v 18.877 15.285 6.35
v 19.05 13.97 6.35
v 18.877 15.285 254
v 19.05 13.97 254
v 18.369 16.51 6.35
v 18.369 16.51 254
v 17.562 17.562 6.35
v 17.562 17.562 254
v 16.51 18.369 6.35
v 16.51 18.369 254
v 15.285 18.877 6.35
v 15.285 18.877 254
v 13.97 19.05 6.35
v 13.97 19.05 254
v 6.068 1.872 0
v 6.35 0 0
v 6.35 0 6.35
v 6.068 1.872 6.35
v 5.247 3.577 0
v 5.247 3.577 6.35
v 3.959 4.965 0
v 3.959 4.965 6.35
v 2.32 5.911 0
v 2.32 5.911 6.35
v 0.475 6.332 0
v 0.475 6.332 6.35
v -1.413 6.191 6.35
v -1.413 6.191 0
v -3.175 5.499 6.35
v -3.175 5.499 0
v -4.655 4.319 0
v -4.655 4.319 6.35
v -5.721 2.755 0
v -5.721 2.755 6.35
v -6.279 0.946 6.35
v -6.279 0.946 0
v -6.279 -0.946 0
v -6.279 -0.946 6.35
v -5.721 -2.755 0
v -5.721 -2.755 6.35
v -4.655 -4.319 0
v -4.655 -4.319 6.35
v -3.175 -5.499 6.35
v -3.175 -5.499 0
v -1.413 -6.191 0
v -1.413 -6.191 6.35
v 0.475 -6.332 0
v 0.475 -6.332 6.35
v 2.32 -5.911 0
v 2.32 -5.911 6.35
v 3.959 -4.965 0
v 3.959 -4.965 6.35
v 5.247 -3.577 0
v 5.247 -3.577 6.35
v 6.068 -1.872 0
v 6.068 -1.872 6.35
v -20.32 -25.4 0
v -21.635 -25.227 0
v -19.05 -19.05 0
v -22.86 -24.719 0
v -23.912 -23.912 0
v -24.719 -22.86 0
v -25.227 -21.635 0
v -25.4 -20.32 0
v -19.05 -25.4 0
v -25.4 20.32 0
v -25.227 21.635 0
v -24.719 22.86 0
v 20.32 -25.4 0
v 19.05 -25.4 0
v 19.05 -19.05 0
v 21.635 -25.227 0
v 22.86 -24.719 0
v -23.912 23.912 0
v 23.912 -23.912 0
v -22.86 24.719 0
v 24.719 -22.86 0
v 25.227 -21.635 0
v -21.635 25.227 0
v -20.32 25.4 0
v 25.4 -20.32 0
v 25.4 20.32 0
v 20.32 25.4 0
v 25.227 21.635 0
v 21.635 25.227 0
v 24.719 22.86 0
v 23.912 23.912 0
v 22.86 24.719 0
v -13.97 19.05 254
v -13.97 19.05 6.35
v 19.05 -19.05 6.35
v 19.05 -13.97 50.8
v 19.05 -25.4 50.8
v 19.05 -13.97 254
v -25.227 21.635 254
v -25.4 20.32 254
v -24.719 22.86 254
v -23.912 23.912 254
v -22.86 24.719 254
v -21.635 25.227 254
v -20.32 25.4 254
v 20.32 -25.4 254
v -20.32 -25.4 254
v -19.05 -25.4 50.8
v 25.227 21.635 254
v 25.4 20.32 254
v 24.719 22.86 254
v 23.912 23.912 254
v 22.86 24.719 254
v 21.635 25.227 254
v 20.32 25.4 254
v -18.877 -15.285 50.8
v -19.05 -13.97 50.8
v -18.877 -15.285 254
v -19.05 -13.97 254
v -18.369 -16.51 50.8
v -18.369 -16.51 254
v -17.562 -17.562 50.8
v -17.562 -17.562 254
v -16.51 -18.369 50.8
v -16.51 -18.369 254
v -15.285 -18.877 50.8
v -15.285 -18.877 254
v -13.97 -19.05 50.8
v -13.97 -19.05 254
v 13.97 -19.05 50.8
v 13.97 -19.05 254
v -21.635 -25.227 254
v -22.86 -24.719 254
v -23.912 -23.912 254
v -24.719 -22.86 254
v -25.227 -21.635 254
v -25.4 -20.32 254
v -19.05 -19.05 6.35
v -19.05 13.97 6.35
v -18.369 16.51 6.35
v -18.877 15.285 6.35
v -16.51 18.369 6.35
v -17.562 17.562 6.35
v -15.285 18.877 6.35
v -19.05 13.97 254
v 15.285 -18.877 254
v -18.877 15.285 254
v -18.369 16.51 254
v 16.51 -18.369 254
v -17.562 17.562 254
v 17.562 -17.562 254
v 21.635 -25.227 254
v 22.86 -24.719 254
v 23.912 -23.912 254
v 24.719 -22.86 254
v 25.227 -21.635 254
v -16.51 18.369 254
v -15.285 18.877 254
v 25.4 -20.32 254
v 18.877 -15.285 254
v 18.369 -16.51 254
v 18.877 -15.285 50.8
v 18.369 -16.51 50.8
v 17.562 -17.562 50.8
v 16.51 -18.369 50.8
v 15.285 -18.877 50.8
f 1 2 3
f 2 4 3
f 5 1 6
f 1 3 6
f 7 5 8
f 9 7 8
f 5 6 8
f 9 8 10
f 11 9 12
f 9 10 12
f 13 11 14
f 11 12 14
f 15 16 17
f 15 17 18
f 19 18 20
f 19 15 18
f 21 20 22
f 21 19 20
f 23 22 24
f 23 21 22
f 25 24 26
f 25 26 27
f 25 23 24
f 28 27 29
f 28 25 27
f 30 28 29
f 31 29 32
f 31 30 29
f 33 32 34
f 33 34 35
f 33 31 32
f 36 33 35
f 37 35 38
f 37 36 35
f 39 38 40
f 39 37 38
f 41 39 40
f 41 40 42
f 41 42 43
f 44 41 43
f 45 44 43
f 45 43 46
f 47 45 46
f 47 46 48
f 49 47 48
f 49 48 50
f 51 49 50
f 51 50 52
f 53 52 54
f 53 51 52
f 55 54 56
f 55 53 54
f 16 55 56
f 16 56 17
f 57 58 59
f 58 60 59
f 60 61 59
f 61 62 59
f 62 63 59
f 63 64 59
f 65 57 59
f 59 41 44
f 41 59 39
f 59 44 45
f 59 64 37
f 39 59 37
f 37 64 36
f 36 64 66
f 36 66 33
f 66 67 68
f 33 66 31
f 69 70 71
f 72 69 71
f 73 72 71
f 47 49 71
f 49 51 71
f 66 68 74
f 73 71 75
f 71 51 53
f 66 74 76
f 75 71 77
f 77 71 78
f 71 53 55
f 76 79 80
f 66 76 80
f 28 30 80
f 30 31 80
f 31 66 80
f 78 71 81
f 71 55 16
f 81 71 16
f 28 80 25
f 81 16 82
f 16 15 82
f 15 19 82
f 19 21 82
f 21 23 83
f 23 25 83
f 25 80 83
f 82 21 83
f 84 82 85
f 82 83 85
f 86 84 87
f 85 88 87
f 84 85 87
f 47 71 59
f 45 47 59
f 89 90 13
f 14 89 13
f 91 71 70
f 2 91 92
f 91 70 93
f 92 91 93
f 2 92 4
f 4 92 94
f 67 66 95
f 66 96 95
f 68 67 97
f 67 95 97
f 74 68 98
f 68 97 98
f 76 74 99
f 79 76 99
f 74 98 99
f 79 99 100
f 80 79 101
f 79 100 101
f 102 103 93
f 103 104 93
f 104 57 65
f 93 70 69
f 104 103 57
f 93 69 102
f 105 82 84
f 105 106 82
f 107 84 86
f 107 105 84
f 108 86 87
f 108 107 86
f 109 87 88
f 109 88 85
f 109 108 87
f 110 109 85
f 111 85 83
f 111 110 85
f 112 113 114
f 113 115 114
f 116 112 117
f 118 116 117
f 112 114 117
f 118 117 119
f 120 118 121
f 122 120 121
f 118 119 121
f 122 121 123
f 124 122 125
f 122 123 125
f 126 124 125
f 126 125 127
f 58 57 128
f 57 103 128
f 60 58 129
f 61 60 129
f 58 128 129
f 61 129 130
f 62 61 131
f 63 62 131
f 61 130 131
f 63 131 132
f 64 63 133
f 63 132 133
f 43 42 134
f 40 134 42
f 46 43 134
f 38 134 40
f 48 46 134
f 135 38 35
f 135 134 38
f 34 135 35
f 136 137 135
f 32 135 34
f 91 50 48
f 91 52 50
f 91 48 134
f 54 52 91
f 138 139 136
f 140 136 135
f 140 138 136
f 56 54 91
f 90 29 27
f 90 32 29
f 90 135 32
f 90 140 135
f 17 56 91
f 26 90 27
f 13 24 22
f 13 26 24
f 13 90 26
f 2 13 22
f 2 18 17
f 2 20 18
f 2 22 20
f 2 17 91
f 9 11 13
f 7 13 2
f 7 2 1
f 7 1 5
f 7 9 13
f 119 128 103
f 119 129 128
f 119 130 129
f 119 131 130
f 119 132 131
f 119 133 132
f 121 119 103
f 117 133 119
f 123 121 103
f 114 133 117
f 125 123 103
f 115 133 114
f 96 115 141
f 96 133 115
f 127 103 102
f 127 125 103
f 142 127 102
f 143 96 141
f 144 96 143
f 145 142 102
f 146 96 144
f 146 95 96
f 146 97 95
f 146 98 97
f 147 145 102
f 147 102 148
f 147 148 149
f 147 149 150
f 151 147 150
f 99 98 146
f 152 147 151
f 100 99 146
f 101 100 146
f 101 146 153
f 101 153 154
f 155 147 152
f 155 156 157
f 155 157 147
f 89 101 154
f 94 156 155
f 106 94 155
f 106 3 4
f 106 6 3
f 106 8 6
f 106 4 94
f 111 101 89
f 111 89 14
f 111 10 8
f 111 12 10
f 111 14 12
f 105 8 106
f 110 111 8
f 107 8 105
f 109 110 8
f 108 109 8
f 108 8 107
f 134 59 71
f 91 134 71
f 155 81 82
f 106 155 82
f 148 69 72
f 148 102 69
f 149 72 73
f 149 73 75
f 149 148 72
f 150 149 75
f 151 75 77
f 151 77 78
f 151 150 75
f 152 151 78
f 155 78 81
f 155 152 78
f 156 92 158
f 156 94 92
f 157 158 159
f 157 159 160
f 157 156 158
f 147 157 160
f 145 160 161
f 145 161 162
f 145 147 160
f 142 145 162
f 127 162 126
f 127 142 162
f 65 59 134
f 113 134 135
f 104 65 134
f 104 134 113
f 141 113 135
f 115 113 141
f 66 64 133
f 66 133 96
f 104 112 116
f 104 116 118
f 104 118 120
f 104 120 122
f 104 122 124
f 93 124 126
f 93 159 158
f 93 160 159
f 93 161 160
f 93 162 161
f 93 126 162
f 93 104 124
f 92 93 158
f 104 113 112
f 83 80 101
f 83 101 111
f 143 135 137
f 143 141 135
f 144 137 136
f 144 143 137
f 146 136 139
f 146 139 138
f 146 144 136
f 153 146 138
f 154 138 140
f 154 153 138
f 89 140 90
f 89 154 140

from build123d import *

# Parameters (mm, degrees)
F0_W     = 50.8
F0_H     = 50.8
F0_W_2   = 38.1
F0_H_2   = 38.1
F1_DEPTH = 254
F2_W     = 38.1
F2_H     = 50.8
F3_DEPTH = 6.35
F4_W     = 38.1
F4_H     = 38.1
F4_R     = 6.35
F5_DEPTH = 6.35
F6_R     = 5.08


with BuildPart() as f1:
    # F0 (on Top) → F1 (new body)
    with BuildSketch(Plane.XY):
        Rectangle(F0_W, F0_H)
        Rectangle(F0_W_2, F0_H_2, mode=Mode.SUBTRACT)
    extrude(amount=F1_DEPTH)

    # F2 (on face) → F3 (cut)
    with BuildSketch(Plane.XZ.offset(25.4)):
        with Locations((0, 25.4)):
            Rectangle(F2_W, F2_H)
    extrude(amount=-F3_DEPTH, mode=Mode.SUBTRACT)

    # F4 (on Top) → F5 (join)
    with BuildSketch(Plane.XY):
        Rectangle(F4_W, F4_H)
        Circle(F4_R, mode=Mode.SUBTRACT)
    extrude(amount=F5_DEPTH)

    # F6
    f6_edges = [f1.edges().sort_by_distance(p)[0] for p in [
        (-25.4, -25.4, 127),
        (-25.4, 25.4, 127),
        (25.4, -25.4, 127),
        (25.4, 25.4, 127),
        (-19.05, 19.05, 130.175),
        (19.05, 19.05, 130.175),
        (-19.05, -19.05, 152.4),
        (19.05, -19.05, 152.4),
    ]]
    fillet(f6_edges, radius=F6_R)


solid = f1.part
